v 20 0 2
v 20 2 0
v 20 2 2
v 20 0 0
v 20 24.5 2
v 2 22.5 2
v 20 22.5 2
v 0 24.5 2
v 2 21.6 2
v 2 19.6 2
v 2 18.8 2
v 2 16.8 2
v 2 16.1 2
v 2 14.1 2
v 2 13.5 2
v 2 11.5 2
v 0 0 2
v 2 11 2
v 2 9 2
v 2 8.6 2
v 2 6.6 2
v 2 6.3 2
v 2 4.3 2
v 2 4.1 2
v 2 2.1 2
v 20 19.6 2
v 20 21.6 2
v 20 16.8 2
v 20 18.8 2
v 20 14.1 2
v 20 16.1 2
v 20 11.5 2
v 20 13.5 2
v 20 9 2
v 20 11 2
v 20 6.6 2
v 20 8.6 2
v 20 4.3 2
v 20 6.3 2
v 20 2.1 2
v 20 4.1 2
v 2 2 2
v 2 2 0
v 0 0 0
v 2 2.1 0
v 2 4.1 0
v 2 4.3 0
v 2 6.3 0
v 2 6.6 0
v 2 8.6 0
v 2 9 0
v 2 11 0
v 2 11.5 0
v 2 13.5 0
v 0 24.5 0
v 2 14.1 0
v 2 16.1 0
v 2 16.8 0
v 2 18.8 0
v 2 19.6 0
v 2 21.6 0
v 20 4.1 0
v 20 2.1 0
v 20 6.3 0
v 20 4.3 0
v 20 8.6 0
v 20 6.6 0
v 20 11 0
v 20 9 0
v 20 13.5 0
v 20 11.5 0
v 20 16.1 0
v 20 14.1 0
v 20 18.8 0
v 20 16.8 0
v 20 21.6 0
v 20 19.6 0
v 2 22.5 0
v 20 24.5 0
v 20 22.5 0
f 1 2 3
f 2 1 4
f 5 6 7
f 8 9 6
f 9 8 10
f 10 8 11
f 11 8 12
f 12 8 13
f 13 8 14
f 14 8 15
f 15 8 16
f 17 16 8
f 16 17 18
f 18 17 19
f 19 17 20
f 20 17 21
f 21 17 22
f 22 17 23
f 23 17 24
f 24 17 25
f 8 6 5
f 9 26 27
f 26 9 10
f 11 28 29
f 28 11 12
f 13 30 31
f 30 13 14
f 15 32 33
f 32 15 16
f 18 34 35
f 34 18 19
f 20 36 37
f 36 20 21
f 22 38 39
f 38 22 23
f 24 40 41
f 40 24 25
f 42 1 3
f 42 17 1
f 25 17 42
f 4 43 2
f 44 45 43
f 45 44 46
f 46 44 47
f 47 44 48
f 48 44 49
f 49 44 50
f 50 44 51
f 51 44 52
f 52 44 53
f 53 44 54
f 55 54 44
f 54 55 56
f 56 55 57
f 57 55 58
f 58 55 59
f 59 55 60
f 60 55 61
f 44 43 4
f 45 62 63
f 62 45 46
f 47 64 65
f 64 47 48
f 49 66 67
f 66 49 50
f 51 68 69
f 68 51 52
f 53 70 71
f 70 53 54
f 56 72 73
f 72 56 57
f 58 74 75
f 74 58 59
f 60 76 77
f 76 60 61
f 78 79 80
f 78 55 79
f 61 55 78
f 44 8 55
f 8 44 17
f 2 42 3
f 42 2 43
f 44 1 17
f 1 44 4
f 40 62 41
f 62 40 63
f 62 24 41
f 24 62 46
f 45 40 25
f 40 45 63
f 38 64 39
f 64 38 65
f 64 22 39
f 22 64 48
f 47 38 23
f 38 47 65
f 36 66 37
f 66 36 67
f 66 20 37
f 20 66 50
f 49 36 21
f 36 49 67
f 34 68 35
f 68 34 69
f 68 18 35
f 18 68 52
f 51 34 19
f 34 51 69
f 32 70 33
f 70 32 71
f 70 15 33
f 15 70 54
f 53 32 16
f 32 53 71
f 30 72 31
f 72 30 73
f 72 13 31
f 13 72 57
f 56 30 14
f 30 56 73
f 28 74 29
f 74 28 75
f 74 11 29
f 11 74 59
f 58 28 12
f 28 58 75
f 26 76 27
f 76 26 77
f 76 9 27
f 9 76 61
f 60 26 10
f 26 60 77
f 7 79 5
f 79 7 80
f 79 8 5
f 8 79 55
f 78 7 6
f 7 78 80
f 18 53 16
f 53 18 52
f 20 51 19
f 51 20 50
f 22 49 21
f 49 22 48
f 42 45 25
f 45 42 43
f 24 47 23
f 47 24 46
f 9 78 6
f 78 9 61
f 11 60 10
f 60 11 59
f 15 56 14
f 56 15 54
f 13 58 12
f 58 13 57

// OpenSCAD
// Testing spaces
line_w=2.0;
line_l=20.0;
line_h=2.0;
space_scale=0.1;

union() {
  cube(size=[line_w,10*line_w+space_scale*9*10/2,line_h],center=false);
  for(i=[0:9]) {
    translate([0,(line_w+space_scale)*i+space_scale*(i-1)*i/2,0]) cube(size=[line_l,line_w,line_h],center=false);
  }
}
